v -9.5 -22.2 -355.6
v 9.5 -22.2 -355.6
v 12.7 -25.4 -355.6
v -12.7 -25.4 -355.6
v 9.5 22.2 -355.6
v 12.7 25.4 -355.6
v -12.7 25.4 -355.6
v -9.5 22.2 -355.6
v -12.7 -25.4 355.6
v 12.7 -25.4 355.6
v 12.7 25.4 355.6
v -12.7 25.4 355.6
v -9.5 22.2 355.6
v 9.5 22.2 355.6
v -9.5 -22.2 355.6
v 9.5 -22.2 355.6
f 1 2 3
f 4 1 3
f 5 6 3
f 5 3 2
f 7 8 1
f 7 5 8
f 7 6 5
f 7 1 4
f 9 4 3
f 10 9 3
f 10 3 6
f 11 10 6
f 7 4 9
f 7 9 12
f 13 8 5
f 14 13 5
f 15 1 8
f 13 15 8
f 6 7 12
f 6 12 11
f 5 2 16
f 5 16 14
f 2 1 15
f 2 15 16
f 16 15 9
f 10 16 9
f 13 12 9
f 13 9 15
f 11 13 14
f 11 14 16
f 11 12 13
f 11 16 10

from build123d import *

# Parameters (mm, degrees)
SKETCH1_W           = 25.4
SKETCH1_H           = 50.8
SKETCH1_W_2         = 18.9992
SKETCH1_H_2         = 44.3992
BOSS_EXTRUDE1_DEPTH = 749.3
SKETCH2_W           = 25.4
SKETCH2_H           = 50.8
CUT_EXTRUDE1_DEPTH  = 393.7
SKETCH3_W           = 25.4
SKETCH3_H           = 50.8
CUT_EXTRUDE2_DEPTH  = 393.7


with BuildPart() as part:
    # Sketch1 → Boss-Extrude1 (new, symmetric)
    with BuildSketch(Plane.XY):
        Rectangle(SKETCH1_W, SKETCH1_H)
        Rectangle(SKETCH1_W_2, SKETCH1_H_2, mode=Mode.SUBTRACT)
    extrude(amount=BOSS_EXTRUDE1_DEPTH, both=True)

    # Sketch2 → Cut-Extrude1 (cut)
    with BuildSketch(Plane.XY.offset(749.3)):
        Rectangle(SKETCH2_W, SKETCH2_H)
    extrude(amount=-CUT_EXTRUDE1_DEPTH, mode=Mode.SUBTRACT)

    # Sketch3 → Cut-Extrude2 (cut)
    with BuildSketch(Plane(origin=(0, 0, -749.3), x_dir=(-1, 0, 0), z_dir=(0, 0, -1))):
        Rectangle(SKETCH3_W, SKETCH3_H)
    extrude(amount=-CUT_EXTRUDE2_DEPTH, mode=Mode.SUBTRACT)


solid = part.part
